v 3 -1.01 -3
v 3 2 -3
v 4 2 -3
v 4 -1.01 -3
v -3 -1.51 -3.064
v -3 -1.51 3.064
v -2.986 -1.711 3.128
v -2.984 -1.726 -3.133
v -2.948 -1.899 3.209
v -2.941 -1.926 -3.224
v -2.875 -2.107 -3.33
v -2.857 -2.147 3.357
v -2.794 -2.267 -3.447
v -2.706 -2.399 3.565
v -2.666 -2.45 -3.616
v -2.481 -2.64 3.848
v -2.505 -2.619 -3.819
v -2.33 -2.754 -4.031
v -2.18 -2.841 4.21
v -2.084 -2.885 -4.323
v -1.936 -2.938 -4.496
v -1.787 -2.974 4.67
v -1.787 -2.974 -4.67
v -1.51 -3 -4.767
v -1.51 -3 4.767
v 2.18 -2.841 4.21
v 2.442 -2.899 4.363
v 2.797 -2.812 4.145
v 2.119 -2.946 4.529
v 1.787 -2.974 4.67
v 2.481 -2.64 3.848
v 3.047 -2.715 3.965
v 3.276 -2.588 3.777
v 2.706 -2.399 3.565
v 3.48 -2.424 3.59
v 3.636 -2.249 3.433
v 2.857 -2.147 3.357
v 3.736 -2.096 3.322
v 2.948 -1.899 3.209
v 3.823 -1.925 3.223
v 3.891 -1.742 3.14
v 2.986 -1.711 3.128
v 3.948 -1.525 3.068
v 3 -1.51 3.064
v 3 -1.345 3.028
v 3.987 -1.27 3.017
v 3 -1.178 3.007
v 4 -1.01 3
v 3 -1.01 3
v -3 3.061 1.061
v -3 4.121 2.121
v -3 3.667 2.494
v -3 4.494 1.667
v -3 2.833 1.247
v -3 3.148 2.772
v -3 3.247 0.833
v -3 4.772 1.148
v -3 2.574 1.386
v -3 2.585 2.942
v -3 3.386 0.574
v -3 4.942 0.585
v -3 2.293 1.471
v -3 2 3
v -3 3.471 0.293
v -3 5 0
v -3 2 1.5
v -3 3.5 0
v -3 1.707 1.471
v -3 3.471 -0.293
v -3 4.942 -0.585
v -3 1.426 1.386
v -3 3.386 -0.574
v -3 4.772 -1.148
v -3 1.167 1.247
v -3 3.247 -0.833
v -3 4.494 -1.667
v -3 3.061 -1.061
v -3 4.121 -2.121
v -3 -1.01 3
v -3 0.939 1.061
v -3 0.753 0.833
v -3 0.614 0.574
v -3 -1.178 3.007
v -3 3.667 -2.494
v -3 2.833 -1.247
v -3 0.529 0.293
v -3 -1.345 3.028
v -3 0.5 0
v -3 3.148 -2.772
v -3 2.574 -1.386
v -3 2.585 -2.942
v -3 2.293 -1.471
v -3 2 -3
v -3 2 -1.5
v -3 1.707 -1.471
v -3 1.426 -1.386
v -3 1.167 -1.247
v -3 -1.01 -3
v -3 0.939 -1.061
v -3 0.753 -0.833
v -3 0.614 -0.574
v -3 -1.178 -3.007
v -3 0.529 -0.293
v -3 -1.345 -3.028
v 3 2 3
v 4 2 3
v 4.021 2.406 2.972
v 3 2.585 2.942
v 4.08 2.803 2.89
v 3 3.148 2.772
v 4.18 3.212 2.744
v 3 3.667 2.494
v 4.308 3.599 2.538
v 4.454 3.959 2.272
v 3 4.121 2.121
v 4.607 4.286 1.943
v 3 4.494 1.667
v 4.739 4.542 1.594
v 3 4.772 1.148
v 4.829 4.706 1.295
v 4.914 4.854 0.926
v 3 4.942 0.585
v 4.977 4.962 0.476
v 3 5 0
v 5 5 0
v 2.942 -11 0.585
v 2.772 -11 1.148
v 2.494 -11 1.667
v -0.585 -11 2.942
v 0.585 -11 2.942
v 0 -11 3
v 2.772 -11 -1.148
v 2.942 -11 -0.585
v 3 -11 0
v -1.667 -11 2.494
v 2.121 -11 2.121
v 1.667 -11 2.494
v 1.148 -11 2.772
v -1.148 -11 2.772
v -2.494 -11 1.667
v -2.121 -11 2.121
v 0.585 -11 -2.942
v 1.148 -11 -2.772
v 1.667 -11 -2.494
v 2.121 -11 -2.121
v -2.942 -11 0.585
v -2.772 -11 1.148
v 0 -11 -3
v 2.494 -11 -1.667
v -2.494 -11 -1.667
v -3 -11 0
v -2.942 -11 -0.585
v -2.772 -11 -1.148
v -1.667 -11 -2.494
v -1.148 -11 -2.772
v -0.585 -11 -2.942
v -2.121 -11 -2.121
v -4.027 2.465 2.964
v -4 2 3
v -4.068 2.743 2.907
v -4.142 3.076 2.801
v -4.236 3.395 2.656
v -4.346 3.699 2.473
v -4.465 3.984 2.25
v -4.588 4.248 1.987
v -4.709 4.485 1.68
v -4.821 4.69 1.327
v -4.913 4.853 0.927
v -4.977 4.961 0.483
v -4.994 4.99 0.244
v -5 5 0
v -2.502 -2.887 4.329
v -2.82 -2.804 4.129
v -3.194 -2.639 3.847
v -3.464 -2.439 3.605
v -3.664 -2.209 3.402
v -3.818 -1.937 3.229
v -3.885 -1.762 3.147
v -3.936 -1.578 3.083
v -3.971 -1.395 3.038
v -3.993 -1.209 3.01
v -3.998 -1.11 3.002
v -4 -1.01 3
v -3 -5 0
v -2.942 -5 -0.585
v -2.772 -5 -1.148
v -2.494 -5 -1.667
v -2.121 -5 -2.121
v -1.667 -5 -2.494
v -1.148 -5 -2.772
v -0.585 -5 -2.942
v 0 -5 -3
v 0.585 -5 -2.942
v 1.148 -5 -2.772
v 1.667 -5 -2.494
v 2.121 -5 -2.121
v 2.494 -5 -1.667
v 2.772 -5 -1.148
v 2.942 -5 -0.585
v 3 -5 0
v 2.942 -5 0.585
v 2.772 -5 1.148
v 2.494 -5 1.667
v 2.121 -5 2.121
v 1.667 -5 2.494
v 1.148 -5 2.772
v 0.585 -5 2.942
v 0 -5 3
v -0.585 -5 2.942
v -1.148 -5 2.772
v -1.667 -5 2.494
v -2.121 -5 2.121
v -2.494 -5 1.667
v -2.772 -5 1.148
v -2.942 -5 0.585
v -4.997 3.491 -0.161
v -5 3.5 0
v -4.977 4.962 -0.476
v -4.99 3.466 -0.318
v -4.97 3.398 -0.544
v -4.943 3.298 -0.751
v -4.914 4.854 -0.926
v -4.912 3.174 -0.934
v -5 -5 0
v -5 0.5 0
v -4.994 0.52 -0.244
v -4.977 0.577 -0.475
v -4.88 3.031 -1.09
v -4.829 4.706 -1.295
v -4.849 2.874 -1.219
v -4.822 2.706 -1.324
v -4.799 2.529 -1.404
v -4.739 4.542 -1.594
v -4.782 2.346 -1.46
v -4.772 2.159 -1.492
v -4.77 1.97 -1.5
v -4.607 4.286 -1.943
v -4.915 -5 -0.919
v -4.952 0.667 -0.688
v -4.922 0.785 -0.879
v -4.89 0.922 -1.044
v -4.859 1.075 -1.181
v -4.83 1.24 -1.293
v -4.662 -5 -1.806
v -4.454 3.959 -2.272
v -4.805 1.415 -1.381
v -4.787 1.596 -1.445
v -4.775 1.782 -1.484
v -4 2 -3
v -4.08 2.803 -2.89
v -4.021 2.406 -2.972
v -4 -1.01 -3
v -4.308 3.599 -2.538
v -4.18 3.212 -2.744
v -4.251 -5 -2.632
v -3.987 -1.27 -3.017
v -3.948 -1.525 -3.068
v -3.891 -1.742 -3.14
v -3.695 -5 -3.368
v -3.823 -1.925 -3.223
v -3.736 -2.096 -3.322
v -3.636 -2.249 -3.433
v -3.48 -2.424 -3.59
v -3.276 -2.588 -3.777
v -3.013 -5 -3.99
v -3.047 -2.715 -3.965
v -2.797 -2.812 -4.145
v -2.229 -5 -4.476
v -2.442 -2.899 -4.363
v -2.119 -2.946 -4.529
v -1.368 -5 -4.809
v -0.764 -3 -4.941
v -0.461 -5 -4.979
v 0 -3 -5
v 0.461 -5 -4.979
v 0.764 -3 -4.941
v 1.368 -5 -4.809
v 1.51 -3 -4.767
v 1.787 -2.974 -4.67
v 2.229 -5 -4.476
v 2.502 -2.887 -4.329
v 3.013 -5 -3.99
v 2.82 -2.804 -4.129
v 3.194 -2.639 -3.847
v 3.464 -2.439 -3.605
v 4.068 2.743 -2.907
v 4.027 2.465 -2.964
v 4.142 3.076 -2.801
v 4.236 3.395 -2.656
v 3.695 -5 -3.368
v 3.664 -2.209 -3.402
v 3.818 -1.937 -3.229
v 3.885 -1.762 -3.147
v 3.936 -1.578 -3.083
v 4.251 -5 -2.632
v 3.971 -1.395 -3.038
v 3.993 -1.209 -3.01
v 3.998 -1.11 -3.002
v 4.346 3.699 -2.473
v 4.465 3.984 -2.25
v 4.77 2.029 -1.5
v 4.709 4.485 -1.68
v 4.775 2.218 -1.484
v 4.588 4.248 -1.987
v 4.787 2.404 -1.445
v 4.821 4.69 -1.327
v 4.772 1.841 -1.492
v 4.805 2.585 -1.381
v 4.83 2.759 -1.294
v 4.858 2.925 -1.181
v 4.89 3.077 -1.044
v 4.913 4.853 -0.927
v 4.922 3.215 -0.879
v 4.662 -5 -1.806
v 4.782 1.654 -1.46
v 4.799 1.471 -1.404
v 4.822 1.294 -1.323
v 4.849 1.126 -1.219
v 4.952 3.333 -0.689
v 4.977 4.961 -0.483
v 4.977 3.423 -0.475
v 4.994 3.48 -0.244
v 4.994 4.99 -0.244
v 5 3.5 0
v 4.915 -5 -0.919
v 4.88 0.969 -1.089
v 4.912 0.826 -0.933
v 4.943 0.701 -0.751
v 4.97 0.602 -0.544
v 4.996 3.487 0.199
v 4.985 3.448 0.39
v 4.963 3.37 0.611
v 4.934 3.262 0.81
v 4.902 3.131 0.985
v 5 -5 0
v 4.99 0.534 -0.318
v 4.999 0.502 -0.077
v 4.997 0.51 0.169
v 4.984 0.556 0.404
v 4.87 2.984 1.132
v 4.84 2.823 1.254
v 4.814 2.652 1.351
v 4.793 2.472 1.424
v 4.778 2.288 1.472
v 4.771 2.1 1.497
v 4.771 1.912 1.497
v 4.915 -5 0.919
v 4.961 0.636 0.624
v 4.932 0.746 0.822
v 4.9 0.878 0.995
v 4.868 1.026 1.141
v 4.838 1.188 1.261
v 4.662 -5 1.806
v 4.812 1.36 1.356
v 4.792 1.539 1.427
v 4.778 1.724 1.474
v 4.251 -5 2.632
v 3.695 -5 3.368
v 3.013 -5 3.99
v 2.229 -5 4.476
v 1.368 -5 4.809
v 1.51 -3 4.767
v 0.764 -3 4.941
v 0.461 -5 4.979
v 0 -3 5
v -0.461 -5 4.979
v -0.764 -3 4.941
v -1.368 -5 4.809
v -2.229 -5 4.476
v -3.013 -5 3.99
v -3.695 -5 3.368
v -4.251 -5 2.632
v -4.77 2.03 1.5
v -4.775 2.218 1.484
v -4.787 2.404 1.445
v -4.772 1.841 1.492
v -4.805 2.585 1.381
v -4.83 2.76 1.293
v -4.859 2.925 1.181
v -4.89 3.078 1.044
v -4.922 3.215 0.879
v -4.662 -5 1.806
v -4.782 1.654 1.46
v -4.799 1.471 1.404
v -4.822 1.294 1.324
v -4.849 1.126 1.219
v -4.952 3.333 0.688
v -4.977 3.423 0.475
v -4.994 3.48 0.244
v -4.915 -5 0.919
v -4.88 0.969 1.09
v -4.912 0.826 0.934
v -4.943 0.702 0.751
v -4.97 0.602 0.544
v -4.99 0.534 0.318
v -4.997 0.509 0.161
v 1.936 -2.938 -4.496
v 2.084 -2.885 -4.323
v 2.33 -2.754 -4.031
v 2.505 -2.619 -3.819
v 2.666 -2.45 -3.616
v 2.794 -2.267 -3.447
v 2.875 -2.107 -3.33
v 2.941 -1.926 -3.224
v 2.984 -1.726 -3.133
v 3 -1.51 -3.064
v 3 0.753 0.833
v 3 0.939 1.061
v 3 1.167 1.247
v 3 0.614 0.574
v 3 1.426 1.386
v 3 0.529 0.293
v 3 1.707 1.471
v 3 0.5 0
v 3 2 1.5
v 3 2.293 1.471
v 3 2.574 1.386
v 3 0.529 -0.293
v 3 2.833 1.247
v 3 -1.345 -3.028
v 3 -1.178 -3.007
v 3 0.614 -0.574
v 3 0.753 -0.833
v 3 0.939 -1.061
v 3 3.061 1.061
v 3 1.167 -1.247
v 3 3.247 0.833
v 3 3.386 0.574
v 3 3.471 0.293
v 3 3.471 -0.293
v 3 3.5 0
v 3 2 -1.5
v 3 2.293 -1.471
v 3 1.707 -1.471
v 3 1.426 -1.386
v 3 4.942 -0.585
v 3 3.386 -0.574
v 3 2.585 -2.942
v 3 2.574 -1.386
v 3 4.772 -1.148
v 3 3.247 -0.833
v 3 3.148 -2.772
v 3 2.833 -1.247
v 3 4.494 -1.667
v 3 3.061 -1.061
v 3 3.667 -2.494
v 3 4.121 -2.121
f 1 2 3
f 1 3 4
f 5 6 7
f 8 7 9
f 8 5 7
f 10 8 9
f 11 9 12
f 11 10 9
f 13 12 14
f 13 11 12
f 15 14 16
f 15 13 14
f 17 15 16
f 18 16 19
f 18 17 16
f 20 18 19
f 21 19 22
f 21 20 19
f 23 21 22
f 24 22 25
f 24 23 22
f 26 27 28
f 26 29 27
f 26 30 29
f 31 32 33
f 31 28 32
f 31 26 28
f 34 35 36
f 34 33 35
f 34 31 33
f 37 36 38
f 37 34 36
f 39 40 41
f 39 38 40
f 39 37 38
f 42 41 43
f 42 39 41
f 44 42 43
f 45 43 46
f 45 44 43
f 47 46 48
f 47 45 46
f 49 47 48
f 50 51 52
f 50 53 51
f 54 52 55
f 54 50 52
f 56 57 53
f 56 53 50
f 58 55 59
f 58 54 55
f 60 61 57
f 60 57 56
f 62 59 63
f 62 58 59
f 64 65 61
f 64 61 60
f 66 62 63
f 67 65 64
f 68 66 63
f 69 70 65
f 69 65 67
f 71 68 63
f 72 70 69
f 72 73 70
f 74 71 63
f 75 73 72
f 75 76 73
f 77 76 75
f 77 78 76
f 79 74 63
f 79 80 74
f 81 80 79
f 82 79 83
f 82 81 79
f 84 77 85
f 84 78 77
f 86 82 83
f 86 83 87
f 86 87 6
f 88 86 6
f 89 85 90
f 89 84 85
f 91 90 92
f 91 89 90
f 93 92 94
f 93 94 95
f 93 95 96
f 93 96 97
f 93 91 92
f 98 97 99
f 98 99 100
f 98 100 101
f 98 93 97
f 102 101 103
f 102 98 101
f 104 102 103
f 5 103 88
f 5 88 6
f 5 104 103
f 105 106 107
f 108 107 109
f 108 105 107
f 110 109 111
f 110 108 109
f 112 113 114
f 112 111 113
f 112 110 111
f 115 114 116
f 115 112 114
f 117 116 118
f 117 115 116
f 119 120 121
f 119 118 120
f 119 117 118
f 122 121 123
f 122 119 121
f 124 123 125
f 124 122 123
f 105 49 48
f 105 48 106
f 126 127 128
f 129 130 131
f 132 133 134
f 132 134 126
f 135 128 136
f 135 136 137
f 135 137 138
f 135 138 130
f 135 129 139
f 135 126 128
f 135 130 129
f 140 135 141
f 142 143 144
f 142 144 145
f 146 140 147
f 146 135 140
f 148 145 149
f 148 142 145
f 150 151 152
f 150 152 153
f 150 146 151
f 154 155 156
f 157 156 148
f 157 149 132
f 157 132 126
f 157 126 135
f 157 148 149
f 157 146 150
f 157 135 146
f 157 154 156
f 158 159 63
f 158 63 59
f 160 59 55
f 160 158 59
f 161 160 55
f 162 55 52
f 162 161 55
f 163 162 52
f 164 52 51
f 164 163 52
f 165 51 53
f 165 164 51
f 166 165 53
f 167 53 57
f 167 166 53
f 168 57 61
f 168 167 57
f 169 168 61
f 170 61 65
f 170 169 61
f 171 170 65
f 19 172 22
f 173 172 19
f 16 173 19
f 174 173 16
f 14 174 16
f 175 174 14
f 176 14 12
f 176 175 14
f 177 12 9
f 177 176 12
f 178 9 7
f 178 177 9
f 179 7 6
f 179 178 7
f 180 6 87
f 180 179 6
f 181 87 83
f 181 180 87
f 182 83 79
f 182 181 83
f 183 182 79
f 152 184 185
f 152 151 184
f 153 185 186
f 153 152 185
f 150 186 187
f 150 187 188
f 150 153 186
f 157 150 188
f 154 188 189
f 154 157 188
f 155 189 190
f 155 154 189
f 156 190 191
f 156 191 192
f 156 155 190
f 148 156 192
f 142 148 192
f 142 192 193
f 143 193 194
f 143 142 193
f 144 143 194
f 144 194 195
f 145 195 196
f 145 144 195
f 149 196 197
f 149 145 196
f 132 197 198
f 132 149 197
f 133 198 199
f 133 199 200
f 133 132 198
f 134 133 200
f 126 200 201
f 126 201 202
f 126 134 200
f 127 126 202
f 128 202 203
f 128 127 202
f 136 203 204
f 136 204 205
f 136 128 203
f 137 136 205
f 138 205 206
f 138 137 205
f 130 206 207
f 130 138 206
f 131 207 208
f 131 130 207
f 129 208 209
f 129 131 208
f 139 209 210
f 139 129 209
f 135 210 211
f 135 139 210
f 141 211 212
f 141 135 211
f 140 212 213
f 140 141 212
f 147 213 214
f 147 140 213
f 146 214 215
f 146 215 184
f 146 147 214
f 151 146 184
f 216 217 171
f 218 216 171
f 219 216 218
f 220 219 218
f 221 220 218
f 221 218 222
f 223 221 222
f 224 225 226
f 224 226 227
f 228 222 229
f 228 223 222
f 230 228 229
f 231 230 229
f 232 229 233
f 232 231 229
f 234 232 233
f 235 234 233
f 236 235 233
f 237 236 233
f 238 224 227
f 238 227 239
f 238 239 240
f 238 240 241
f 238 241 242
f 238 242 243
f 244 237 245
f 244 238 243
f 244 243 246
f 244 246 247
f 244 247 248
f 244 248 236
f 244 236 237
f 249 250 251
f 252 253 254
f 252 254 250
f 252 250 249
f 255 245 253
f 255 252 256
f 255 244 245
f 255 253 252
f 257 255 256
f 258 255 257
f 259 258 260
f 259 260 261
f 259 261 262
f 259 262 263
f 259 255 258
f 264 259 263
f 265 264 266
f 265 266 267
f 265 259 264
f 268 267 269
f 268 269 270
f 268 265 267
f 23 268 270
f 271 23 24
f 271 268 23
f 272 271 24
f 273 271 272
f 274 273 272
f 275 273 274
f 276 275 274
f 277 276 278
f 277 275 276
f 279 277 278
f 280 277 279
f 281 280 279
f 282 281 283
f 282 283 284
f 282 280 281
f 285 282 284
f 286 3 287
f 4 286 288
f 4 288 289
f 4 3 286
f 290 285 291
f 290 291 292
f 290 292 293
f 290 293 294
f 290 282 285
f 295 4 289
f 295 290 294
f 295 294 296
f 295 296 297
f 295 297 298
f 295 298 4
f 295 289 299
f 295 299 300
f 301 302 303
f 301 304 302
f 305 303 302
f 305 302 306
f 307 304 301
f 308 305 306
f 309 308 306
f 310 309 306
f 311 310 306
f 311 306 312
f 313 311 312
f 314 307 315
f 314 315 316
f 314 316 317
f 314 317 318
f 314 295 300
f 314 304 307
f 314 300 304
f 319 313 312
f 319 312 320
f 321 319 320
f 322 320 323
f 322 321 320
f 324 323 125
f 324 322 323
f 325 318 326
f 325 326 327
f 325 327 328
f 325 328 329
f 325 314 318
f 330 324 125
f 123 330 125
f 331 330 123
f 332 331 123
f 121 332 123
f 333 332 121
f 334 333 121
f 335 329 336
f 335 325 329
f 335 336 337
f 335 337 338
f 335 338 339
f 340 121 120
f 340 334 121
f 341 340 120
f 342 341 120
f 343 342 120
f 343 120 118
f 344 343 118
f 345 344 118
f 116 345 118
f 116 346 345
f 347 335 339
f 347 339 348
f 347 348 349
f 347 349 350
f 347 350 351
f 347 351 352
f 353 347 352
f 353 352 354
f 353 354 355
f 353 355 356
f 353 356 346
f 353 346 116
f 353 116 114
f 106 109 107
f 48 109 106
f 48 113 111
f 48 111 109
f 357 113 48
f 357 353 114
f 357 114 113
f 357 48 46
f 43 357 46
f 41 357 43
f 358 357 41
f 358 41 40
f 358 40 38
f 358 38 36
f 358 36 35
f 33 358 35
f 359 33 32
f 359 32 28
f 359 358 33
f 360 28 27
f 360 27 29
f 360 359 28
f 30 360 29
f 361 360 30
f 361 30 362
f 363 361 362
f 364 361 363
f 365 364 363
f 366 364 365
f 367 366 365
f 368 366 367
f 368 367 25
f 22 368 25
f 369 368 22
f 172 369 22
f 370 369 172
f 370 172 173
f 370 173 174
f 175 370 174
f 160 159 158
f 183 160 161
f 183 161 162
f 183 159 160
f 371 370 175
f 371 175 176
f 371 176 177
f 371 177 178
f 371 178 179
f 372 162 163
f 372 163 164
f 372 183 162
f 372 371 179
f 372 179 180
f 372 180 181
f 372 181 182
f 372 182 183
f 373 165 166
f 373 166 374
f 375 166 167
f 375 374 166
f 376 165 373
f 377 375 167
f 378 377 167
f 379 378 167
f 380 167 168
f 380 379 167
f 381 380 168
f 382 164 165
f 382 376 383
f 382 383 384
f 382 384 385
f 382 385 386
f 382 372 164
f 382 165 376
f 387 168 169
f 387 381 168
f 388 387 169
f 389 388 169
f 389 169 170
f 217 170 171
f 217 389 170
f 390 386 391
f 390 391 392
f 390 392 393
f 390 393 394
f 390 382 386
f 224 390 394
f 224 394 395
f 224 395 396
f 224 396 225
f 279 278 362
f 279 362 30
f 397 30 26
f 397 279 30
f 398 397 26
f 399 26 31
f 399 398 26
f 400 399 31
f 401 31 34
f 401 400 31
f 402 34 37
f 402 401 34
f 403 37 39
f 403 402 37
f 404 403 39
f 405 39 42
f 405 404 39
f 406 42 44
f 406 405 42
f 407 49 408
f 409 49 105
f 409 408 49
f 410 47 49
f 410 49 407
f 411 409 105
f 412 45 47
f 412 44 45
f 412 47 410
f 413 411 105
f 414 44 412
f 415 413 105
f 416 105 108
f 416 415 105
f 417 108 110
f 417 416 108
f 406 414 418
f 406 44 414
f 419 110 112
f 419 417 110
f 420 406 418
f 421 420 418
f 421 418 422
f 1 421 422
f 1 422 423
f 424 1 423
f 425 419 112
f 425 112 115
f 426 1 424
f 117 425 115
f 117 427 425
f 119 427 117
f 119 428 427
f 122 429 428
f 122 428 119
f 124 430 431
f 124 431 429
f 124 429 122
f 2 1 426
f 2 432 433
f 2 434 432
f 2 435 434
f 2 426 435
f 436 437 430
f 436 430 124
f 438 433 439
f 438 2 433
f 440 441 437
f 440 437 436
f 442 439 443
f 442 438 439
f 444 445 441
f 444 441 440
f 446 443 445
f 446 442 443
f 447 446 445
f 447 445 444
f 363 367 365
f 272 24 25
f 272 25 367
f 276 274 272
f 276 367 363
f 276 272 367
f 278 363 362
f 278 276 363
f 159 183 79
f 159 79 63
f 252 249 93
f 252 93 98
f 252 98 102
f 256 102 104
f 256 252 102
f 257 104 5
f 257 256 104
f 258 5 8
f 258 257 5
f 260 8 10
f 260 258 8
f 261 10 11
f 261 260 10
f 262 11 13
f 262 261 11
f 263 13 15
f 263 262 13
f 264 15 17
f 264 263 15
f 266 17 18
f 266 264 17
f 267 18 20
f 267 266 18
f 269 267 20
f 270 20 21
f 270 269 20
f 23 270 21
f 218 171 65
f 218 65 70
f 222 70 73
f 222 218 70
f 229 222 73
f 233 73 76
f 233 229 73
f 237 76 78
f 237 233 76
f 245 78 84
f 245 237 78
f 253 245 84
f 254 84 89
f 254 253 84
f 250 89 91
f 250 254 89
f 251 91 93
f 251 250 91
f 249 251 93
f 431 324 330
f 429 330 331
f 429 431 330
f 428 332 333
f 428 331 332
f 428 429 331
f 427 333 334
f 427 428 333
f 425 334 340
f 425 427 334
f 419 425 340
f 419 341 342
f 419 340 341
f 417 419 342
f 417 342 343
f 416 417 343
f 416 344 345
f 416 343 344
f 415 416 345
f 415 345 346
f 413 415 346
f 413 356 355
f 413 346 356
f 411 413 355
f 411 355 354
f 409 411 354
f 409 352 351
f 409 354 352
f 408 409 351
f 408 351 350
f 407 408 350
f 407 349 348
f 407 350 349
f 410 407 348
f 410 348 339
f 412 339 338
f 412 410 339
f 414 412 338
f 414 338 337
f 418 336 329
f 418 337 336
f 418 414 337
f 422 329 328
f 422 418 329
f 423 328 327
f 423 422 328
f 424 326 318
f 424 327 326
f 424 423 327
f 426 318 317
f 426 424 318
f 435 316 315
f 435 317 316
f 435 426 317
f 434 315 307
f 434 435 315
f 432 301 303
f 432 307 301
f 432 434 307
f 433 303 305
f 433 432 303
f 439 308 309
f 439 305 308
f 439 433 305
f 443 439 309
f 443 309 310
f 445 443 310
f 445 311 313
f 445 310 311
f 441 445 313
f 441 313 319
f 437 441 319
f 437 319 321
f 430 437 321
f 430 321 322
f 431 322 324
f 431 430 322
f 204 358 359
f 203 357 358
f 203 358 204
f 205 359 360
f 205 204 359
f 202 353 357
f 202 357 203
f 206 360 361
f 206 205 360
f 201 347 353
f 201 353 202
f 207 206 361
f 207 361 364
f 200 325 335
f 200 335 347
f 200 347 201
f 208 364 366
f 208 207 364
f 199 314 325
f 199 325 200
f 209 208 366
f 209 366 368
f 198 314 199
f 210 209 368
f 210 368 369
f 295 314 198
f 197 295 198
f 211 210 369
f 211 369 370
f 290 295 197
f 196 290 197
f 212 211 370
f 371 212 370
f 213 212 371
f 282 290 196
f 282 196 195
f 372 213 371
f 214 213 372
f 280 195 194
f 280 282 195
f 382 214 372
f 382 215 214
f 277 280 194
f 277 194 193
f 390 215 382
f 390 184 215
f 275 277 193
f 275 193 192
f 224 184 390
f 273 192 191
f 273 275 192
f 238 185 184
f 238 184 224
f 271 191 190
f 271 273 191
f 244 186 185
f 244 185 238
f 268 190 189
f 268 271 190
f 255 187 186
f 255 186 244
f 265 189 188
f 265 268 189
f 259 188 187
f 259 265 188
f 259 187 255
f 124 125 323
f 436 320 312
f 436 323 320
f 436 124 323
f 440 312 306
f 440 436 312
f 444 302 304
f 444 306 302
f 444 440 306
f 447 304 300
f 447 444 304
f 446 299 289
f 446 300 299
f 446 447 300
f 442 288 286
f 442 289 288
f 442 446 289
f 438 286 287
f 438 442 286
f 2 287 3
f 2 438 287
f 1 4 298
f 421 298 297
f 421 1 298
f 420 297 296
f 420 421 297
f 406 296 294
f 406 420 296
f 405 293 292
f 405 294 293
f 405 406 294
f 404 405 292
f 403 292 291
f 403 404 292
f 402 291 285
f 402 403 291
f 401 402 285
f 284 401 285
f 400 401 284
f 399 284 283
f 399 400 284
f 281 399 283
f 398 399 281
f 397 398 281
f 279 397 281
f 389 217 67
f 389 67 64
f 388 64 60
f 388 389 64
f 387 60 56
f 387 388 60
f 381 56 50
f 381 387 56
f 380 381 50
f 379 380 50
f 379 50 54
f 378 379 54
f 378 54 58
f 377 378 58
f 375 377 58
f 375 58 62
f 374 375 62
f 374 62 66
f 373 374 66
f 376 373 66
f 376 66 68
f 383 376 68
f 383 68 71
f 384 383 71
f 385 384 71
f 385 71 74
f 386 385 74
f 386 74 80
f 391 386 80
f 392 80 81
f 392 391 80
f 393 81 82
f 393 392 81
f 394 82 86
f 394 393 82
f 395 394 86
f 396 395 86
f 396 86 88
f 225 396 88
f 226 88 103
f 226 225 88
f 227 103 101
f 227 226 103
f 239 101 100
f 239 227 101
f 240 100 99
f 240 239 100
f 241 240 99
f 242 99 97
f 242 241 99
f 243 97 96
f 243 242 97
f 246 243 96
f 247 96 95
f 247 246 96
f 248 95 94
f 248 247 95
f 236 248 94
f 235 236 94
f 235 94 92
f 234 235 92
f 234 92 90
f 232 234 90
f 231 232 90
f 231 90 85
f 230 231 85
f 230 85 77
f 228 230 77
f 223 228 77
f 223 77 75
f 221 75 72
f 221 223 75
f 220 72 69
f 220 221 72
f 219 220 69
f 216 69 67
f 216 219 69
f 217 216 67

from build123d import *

# Parameters (mm, degrees)
CORTAR_EXTRUIR1_DEPTH      = 5
CORTAR_EXTRUIR1_DEPTH_BACK = 5
CROQUIS2_R                 = 1.5
CORTAR_EXTRUIR2_DEPTH      = 5
CORTAR_EXTRUIR2_DEPTH_BACK = 5


with BuildPart() as part:
    # Croquis1 → Revolución1 (revolve)
    with BuildSketch(Plane.XY):
        Polygon((3, 5), (5, 5), (5, -5), (3, -5), (3, -11), (0, -11), (0, -3), (0, 5), align=None)
    revolve(axis=Axis((0, -3, 0), (0, -1, 0)))

    # Croquis2 → Cortar-Extruir1 (cut, two sides: drawn at the far end of the back side and taken through both)
    with BuildSketch(Plane(origin=(0, 0, 0), x_dir=(0, 0, -1), z_dir=(1, 0, 0)).offset(-CORTAR_EXTRUIR1_DEPTH_BACK)):
        with BuildLine():
            Line((-5, 5), (-5, -3))
            Line((-5, -3), (-4.99, -3))
            ThreePointArc((-4.99, -3), (-3.582857505, -2.417142495), (-3, -1.01))
            Line((-3, -1.01), (-3, 2))
            ThreePointArc((-3, 2), (-2.121320344, 4.121320344), (0, 5))
            Line((0, 5), (-5, 5))
        make_face()
        with BuildLine():
            Line((5, 5), (0, 5))
            ThreePointArc((0, 5), (2.121320344, 4.121320344), (3, 2))
            Line((3, 2), (3, -1.01))
            ThreePointArc((3, -1.01), (3.582857505, -2.417142495), (4.99, -3))
            Line((4.99, -3), (5, -3))
            Line((5, -3), (5, 5))
        make_face()
        with Locations((0, 2)):
            Circle(CROQUIS2_R)
    extrude(amount=CORTAR_EXTRUIR1_DEPTH + CORTAR_EXTRUIR1_DEPTH_BACK, mode=Mode.SUBTRACT)

    # Croquis3 → Cortar-Extruir2 (cut, two sides: drawn at the far end of the back side and taken through both)
    with BuildSketch(Plane.XY.offset(-CORTAR_EXTRUIR2_DEPTH_BACK)):
        with BuildLine():
            Line((3, -1.51), (3, 5))
            Line((3, 5), (-3, 5))
            Line((-3, 5), (-3, -1.51))
            ThreePointArc((-3, -1.51), (-2.563589104, -2.563589104), (-1.51, -3))
            Line((-1.51, -3), (1.51, -3))
            ThreePointArc((1.51, -3), (2.563589104, -2.563589104), (3, -1.51))
        make_face()
    extrude(amount=CORTAR_EXTRUIR2_DEPTH + CORTAR_EXTRUIR2_DEPTH_BACK, mode=Mode.SUBTRACT)


solid = part.part
